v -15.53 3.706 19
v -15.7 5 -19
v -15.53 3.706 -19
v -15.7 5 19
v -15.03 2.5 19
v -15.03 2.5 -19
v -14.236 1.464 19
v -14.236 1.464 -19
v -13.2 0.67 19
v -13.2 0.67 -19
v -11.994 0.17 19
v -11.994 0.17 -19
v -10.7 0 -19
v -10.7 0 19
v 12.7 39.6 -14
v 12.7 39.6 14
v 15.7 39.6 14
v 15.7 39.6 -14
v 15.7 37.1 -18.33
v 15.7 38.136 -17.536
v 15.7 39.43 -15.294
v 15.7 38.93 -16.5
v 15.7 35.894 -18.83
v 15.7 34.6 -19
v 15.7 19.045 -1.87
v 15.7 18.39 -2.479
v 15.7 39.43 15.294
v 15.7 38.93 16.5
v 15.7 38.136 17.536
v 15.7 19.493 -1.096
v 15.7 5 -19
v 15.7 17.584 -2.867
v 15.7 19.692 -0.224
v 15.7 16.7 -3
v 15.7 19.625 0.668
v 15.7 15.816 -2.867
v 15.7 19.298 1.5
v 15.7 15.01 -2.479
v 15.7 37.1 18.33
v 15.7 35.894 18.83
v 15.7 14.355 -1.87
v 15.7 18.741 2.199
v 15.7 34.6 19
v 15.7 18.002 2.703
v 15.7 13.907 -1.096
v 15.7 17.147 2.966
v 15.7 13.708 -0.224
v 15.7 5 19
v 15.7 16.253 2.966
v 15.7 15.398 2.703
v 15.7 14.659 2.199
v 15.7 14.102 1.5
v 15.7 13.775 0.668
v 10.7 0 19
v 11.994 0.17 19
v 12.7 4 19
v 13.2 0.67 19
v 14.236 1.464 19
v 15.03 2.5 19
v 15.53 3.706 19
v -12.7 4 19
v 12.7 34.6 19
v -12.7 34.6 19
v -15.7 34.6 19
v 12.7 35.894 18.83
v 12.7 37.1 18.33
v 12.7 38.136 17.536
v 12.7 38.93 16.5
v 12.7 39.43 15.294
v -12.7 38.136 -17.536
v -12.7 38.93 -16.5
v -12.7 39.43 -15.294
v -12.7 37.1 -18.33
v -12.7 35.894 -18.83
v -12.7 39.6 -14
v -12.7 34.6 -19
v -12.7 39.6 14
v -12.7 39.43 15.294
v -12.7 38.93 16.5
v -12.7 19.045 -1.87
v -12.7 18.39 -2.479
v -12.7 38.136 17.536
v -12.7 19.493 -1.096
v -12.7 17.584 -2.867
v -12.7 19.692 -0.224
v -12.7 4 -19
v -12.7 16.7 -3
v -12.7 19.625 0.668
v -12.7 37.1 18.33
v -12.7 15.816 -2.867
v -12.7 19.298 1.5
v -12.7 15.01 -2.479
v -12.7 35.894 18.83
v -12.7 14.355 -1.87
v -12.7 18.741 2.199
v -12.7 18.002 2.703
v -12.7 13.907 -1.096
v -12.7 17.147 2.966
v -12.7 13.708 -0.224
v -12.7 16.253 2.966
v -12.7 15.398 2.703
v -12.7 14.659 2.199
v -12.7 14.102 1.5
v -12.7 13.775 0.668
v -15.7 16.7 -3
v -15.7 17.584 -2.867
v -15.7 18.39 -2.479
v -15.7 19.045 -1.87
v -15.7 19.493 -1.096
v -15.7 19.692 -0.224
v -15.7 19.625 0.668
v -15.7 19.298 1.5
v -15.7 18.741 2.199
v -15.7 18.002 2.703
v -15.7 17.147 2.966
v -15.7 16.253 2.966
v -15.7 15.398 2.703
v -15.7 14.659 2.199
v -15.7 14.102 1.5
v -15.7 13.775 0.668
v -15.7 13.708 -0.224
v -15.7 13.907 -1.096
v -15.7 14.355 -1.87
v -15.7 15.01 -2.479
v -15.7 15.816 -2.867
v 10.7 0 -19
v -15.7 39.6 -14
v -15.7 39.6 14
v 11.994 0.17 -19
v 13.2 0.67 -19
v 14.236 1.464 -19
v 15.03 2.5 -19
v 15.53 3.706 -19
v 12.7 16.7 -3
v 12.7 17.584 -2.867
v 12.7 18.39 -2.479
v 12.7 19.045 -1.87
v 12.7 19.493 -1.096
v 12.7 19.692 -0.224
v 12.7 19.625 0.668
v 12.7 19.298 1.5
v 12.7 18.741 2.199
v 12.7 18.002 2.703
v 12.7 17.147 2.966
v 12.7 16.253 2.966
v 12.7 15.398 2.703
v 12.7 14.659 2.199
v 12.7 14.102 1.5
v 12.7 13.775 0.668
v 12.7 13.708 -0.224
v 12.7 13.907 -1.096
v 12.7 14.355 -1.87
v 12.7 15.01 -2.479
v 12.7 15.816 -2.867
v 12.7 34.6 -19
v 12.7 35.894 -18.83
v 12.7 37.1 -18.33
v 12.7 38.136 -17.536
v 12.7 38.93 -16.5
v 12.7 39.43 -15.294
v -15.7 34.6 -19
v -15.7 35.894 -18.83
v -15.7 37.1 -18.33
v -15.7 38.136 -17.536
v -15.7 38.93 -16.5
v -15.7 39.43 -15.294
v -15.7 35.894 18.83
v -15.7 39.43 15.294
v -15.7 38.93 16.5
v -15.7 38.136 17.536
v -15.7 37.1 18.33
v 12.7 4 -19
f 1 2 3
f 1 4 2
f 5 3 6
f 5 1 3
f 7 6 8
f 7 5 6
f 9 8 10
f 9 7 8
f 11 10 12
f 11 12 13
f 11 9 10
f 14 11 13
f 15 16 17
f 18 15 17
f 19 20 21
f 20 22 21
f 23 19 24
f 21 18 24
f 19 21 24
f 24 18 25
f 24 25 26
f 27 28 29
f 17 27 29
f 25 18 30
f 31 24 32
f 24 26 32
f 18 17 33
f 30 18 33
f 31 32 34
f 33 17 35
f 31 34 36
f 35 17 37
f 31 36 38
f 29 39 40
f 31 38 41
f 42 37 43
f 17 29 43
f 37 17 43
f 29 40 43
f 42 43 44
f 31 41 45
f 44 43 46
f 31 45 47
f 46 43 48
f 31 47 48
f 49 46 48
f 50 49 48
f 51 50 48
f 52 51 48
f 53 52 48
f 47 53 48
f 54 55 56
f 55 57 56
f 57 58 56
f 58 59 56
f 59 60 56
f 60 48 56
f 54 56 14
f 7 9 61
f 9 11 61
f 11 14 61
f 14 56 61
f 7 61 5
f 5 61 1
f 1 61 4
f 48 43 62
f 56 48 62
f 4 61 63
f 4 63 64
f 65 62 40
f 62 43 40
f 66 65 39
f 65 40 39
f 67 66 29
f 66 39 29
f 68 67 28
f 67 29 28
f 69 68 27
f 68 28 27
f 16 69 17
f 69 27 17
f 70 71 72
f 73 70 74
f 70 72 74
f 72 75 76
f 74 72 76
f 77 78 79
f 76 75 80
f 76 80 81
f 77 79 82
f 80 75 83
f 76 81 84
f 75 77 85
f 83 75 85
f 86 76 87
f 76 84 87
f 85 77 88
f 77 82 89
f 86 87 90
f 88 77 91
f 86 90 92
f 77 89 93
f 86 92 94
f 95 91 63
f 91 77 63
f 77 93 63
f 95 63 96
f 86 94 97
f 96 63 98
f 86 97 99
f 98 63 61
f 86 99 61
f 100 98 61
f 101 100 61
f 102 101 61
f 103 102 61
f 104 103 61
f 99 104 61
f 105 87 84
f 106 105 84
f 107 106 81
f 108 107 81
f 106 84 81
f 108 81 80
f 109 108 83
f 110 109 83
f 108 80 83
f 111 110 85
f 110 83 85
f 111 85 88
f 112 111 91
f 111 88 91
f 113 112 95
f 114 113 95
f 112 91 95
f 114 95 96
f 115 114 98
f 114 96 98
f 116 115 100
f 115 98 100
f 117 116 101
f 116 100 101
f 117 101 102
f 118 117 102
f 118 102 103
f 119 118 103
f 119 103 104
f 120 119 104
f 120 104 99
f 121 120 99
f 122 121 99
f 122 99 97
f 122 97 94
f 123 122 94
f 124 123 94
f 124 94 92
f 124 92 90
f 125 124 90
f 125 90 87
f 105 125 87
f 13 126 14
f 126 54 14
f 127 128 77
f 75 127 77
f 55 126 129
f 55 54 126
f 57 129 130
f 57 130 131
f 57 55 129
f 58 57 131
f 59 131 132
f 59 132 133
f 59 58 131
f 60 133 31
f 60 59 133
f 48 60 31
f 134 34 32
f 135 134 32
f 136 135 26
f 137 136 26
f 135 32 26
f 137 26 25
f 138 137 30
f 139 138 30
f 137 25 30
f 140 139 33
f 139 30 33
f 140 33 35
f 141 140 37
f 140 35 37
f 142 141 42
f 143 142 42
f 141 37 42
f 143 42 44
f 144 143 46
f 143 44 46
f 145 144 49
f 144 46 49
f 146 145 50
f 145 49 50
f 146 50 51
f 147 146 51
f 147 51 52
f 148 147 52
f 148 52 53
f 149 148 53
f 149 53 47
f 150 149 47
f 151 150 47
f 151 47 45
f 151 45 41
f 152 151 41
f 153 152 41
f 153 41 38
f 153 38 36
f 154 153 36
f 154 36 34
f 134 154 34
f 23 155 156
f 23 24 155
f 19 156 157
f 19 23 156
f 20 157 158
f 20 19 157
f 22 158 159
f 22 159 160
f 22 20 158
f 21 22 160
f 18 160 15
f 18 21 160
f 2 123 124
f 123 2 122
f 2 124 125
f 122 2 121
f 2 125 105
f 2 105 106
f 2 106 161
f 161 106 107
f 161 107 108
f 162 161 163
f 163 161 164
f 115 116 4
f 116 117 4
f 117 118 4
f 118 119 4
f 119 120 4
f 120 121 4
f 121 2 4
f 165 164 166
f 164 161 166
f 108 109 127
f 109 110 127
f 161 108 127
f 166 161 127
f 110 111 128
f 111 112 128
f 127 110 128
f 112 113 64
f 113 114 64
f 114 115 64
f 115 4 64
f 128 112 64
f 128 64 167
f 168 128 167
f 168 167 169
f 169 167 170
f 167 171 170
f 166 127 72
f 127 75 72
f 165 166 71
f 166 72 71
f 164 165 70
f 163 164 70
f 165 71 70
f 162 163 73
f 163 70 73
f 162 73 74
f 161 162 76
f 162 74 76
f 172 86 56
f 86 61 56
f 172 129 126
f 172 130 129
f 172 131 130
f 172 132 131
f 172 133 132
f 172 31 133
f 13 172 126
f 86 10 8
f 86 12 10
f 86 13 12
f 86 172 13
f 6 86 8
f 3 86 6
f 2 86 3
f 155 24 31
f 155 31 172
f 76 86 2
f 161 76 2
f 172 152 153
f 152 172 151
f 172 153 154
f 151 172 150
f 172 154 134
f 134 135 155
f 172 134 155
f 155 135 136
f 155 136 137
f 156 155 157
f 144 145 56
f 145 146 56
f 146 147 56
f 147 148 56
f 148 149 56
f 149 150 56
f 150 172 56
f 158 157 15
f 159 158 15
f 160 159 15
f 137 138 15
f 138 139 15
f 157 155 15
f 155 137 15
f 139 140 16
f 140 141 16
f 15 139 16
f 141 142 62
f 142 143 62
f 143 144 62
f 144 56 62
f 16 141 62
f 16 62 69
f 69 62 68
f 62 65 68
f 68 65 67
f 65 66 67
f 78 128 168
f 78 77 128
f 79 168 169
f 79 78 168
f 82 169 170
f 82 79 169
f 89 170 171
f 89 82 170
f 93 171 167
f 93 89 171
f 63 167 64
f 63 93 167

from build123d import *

# Parameters (mm, degrees)
BOSS_EXTRUDE1_DEPTH = 19
SKETCH2_R           = 3
CUT_EXTRUDE1_DEPTH  = 32.4
FILLET1_R           = 5


with BuildPart() as part:
    # Sketch1 → Boss-Extrude1 (new body, symmetric)
    with BuildSketch(Plane.XY):
        Polygon((-15.7, 39.6), (-12.7, 39.6), (-12.7, 4), (12.7, 4), (12.7, 39.6), (15.7, 39.6), (15.7, 0), (-15.7, 0), align=None)
    extrude(amount=BOSS_EXTRUDE1_DEPTH, both=True)

    # Sketch2 → Cut-Extrude1 (cut, through all)
    with BuildSketch(Plane(origin=(15.7, 0, 0), x_dir=(0, 0, -1), z_dir=(1, 0, 0))):
        with Locations((0, 16.7)):
            Circle(SKETCH2_R)
    extrude(amount=-CUT_EXTRUDE1_DEPTH, mode=Mode.SUBTRACT)

    # Fillet1
    fillet1_edges = [part.edges().sort_by_distance(p)[0] for p in [
        (14.2, 39.6, -19),
        (15.7, 0, 0),
        (-15.7, 0, 0),
        (14.2, 39.6, 19),
        (-14.2, 39.6, 19),
        (-14.2, 39.6, -19),
    ]]
    fillet(fillet1_edges, radius=FILLET1_R)


solid = part.part
